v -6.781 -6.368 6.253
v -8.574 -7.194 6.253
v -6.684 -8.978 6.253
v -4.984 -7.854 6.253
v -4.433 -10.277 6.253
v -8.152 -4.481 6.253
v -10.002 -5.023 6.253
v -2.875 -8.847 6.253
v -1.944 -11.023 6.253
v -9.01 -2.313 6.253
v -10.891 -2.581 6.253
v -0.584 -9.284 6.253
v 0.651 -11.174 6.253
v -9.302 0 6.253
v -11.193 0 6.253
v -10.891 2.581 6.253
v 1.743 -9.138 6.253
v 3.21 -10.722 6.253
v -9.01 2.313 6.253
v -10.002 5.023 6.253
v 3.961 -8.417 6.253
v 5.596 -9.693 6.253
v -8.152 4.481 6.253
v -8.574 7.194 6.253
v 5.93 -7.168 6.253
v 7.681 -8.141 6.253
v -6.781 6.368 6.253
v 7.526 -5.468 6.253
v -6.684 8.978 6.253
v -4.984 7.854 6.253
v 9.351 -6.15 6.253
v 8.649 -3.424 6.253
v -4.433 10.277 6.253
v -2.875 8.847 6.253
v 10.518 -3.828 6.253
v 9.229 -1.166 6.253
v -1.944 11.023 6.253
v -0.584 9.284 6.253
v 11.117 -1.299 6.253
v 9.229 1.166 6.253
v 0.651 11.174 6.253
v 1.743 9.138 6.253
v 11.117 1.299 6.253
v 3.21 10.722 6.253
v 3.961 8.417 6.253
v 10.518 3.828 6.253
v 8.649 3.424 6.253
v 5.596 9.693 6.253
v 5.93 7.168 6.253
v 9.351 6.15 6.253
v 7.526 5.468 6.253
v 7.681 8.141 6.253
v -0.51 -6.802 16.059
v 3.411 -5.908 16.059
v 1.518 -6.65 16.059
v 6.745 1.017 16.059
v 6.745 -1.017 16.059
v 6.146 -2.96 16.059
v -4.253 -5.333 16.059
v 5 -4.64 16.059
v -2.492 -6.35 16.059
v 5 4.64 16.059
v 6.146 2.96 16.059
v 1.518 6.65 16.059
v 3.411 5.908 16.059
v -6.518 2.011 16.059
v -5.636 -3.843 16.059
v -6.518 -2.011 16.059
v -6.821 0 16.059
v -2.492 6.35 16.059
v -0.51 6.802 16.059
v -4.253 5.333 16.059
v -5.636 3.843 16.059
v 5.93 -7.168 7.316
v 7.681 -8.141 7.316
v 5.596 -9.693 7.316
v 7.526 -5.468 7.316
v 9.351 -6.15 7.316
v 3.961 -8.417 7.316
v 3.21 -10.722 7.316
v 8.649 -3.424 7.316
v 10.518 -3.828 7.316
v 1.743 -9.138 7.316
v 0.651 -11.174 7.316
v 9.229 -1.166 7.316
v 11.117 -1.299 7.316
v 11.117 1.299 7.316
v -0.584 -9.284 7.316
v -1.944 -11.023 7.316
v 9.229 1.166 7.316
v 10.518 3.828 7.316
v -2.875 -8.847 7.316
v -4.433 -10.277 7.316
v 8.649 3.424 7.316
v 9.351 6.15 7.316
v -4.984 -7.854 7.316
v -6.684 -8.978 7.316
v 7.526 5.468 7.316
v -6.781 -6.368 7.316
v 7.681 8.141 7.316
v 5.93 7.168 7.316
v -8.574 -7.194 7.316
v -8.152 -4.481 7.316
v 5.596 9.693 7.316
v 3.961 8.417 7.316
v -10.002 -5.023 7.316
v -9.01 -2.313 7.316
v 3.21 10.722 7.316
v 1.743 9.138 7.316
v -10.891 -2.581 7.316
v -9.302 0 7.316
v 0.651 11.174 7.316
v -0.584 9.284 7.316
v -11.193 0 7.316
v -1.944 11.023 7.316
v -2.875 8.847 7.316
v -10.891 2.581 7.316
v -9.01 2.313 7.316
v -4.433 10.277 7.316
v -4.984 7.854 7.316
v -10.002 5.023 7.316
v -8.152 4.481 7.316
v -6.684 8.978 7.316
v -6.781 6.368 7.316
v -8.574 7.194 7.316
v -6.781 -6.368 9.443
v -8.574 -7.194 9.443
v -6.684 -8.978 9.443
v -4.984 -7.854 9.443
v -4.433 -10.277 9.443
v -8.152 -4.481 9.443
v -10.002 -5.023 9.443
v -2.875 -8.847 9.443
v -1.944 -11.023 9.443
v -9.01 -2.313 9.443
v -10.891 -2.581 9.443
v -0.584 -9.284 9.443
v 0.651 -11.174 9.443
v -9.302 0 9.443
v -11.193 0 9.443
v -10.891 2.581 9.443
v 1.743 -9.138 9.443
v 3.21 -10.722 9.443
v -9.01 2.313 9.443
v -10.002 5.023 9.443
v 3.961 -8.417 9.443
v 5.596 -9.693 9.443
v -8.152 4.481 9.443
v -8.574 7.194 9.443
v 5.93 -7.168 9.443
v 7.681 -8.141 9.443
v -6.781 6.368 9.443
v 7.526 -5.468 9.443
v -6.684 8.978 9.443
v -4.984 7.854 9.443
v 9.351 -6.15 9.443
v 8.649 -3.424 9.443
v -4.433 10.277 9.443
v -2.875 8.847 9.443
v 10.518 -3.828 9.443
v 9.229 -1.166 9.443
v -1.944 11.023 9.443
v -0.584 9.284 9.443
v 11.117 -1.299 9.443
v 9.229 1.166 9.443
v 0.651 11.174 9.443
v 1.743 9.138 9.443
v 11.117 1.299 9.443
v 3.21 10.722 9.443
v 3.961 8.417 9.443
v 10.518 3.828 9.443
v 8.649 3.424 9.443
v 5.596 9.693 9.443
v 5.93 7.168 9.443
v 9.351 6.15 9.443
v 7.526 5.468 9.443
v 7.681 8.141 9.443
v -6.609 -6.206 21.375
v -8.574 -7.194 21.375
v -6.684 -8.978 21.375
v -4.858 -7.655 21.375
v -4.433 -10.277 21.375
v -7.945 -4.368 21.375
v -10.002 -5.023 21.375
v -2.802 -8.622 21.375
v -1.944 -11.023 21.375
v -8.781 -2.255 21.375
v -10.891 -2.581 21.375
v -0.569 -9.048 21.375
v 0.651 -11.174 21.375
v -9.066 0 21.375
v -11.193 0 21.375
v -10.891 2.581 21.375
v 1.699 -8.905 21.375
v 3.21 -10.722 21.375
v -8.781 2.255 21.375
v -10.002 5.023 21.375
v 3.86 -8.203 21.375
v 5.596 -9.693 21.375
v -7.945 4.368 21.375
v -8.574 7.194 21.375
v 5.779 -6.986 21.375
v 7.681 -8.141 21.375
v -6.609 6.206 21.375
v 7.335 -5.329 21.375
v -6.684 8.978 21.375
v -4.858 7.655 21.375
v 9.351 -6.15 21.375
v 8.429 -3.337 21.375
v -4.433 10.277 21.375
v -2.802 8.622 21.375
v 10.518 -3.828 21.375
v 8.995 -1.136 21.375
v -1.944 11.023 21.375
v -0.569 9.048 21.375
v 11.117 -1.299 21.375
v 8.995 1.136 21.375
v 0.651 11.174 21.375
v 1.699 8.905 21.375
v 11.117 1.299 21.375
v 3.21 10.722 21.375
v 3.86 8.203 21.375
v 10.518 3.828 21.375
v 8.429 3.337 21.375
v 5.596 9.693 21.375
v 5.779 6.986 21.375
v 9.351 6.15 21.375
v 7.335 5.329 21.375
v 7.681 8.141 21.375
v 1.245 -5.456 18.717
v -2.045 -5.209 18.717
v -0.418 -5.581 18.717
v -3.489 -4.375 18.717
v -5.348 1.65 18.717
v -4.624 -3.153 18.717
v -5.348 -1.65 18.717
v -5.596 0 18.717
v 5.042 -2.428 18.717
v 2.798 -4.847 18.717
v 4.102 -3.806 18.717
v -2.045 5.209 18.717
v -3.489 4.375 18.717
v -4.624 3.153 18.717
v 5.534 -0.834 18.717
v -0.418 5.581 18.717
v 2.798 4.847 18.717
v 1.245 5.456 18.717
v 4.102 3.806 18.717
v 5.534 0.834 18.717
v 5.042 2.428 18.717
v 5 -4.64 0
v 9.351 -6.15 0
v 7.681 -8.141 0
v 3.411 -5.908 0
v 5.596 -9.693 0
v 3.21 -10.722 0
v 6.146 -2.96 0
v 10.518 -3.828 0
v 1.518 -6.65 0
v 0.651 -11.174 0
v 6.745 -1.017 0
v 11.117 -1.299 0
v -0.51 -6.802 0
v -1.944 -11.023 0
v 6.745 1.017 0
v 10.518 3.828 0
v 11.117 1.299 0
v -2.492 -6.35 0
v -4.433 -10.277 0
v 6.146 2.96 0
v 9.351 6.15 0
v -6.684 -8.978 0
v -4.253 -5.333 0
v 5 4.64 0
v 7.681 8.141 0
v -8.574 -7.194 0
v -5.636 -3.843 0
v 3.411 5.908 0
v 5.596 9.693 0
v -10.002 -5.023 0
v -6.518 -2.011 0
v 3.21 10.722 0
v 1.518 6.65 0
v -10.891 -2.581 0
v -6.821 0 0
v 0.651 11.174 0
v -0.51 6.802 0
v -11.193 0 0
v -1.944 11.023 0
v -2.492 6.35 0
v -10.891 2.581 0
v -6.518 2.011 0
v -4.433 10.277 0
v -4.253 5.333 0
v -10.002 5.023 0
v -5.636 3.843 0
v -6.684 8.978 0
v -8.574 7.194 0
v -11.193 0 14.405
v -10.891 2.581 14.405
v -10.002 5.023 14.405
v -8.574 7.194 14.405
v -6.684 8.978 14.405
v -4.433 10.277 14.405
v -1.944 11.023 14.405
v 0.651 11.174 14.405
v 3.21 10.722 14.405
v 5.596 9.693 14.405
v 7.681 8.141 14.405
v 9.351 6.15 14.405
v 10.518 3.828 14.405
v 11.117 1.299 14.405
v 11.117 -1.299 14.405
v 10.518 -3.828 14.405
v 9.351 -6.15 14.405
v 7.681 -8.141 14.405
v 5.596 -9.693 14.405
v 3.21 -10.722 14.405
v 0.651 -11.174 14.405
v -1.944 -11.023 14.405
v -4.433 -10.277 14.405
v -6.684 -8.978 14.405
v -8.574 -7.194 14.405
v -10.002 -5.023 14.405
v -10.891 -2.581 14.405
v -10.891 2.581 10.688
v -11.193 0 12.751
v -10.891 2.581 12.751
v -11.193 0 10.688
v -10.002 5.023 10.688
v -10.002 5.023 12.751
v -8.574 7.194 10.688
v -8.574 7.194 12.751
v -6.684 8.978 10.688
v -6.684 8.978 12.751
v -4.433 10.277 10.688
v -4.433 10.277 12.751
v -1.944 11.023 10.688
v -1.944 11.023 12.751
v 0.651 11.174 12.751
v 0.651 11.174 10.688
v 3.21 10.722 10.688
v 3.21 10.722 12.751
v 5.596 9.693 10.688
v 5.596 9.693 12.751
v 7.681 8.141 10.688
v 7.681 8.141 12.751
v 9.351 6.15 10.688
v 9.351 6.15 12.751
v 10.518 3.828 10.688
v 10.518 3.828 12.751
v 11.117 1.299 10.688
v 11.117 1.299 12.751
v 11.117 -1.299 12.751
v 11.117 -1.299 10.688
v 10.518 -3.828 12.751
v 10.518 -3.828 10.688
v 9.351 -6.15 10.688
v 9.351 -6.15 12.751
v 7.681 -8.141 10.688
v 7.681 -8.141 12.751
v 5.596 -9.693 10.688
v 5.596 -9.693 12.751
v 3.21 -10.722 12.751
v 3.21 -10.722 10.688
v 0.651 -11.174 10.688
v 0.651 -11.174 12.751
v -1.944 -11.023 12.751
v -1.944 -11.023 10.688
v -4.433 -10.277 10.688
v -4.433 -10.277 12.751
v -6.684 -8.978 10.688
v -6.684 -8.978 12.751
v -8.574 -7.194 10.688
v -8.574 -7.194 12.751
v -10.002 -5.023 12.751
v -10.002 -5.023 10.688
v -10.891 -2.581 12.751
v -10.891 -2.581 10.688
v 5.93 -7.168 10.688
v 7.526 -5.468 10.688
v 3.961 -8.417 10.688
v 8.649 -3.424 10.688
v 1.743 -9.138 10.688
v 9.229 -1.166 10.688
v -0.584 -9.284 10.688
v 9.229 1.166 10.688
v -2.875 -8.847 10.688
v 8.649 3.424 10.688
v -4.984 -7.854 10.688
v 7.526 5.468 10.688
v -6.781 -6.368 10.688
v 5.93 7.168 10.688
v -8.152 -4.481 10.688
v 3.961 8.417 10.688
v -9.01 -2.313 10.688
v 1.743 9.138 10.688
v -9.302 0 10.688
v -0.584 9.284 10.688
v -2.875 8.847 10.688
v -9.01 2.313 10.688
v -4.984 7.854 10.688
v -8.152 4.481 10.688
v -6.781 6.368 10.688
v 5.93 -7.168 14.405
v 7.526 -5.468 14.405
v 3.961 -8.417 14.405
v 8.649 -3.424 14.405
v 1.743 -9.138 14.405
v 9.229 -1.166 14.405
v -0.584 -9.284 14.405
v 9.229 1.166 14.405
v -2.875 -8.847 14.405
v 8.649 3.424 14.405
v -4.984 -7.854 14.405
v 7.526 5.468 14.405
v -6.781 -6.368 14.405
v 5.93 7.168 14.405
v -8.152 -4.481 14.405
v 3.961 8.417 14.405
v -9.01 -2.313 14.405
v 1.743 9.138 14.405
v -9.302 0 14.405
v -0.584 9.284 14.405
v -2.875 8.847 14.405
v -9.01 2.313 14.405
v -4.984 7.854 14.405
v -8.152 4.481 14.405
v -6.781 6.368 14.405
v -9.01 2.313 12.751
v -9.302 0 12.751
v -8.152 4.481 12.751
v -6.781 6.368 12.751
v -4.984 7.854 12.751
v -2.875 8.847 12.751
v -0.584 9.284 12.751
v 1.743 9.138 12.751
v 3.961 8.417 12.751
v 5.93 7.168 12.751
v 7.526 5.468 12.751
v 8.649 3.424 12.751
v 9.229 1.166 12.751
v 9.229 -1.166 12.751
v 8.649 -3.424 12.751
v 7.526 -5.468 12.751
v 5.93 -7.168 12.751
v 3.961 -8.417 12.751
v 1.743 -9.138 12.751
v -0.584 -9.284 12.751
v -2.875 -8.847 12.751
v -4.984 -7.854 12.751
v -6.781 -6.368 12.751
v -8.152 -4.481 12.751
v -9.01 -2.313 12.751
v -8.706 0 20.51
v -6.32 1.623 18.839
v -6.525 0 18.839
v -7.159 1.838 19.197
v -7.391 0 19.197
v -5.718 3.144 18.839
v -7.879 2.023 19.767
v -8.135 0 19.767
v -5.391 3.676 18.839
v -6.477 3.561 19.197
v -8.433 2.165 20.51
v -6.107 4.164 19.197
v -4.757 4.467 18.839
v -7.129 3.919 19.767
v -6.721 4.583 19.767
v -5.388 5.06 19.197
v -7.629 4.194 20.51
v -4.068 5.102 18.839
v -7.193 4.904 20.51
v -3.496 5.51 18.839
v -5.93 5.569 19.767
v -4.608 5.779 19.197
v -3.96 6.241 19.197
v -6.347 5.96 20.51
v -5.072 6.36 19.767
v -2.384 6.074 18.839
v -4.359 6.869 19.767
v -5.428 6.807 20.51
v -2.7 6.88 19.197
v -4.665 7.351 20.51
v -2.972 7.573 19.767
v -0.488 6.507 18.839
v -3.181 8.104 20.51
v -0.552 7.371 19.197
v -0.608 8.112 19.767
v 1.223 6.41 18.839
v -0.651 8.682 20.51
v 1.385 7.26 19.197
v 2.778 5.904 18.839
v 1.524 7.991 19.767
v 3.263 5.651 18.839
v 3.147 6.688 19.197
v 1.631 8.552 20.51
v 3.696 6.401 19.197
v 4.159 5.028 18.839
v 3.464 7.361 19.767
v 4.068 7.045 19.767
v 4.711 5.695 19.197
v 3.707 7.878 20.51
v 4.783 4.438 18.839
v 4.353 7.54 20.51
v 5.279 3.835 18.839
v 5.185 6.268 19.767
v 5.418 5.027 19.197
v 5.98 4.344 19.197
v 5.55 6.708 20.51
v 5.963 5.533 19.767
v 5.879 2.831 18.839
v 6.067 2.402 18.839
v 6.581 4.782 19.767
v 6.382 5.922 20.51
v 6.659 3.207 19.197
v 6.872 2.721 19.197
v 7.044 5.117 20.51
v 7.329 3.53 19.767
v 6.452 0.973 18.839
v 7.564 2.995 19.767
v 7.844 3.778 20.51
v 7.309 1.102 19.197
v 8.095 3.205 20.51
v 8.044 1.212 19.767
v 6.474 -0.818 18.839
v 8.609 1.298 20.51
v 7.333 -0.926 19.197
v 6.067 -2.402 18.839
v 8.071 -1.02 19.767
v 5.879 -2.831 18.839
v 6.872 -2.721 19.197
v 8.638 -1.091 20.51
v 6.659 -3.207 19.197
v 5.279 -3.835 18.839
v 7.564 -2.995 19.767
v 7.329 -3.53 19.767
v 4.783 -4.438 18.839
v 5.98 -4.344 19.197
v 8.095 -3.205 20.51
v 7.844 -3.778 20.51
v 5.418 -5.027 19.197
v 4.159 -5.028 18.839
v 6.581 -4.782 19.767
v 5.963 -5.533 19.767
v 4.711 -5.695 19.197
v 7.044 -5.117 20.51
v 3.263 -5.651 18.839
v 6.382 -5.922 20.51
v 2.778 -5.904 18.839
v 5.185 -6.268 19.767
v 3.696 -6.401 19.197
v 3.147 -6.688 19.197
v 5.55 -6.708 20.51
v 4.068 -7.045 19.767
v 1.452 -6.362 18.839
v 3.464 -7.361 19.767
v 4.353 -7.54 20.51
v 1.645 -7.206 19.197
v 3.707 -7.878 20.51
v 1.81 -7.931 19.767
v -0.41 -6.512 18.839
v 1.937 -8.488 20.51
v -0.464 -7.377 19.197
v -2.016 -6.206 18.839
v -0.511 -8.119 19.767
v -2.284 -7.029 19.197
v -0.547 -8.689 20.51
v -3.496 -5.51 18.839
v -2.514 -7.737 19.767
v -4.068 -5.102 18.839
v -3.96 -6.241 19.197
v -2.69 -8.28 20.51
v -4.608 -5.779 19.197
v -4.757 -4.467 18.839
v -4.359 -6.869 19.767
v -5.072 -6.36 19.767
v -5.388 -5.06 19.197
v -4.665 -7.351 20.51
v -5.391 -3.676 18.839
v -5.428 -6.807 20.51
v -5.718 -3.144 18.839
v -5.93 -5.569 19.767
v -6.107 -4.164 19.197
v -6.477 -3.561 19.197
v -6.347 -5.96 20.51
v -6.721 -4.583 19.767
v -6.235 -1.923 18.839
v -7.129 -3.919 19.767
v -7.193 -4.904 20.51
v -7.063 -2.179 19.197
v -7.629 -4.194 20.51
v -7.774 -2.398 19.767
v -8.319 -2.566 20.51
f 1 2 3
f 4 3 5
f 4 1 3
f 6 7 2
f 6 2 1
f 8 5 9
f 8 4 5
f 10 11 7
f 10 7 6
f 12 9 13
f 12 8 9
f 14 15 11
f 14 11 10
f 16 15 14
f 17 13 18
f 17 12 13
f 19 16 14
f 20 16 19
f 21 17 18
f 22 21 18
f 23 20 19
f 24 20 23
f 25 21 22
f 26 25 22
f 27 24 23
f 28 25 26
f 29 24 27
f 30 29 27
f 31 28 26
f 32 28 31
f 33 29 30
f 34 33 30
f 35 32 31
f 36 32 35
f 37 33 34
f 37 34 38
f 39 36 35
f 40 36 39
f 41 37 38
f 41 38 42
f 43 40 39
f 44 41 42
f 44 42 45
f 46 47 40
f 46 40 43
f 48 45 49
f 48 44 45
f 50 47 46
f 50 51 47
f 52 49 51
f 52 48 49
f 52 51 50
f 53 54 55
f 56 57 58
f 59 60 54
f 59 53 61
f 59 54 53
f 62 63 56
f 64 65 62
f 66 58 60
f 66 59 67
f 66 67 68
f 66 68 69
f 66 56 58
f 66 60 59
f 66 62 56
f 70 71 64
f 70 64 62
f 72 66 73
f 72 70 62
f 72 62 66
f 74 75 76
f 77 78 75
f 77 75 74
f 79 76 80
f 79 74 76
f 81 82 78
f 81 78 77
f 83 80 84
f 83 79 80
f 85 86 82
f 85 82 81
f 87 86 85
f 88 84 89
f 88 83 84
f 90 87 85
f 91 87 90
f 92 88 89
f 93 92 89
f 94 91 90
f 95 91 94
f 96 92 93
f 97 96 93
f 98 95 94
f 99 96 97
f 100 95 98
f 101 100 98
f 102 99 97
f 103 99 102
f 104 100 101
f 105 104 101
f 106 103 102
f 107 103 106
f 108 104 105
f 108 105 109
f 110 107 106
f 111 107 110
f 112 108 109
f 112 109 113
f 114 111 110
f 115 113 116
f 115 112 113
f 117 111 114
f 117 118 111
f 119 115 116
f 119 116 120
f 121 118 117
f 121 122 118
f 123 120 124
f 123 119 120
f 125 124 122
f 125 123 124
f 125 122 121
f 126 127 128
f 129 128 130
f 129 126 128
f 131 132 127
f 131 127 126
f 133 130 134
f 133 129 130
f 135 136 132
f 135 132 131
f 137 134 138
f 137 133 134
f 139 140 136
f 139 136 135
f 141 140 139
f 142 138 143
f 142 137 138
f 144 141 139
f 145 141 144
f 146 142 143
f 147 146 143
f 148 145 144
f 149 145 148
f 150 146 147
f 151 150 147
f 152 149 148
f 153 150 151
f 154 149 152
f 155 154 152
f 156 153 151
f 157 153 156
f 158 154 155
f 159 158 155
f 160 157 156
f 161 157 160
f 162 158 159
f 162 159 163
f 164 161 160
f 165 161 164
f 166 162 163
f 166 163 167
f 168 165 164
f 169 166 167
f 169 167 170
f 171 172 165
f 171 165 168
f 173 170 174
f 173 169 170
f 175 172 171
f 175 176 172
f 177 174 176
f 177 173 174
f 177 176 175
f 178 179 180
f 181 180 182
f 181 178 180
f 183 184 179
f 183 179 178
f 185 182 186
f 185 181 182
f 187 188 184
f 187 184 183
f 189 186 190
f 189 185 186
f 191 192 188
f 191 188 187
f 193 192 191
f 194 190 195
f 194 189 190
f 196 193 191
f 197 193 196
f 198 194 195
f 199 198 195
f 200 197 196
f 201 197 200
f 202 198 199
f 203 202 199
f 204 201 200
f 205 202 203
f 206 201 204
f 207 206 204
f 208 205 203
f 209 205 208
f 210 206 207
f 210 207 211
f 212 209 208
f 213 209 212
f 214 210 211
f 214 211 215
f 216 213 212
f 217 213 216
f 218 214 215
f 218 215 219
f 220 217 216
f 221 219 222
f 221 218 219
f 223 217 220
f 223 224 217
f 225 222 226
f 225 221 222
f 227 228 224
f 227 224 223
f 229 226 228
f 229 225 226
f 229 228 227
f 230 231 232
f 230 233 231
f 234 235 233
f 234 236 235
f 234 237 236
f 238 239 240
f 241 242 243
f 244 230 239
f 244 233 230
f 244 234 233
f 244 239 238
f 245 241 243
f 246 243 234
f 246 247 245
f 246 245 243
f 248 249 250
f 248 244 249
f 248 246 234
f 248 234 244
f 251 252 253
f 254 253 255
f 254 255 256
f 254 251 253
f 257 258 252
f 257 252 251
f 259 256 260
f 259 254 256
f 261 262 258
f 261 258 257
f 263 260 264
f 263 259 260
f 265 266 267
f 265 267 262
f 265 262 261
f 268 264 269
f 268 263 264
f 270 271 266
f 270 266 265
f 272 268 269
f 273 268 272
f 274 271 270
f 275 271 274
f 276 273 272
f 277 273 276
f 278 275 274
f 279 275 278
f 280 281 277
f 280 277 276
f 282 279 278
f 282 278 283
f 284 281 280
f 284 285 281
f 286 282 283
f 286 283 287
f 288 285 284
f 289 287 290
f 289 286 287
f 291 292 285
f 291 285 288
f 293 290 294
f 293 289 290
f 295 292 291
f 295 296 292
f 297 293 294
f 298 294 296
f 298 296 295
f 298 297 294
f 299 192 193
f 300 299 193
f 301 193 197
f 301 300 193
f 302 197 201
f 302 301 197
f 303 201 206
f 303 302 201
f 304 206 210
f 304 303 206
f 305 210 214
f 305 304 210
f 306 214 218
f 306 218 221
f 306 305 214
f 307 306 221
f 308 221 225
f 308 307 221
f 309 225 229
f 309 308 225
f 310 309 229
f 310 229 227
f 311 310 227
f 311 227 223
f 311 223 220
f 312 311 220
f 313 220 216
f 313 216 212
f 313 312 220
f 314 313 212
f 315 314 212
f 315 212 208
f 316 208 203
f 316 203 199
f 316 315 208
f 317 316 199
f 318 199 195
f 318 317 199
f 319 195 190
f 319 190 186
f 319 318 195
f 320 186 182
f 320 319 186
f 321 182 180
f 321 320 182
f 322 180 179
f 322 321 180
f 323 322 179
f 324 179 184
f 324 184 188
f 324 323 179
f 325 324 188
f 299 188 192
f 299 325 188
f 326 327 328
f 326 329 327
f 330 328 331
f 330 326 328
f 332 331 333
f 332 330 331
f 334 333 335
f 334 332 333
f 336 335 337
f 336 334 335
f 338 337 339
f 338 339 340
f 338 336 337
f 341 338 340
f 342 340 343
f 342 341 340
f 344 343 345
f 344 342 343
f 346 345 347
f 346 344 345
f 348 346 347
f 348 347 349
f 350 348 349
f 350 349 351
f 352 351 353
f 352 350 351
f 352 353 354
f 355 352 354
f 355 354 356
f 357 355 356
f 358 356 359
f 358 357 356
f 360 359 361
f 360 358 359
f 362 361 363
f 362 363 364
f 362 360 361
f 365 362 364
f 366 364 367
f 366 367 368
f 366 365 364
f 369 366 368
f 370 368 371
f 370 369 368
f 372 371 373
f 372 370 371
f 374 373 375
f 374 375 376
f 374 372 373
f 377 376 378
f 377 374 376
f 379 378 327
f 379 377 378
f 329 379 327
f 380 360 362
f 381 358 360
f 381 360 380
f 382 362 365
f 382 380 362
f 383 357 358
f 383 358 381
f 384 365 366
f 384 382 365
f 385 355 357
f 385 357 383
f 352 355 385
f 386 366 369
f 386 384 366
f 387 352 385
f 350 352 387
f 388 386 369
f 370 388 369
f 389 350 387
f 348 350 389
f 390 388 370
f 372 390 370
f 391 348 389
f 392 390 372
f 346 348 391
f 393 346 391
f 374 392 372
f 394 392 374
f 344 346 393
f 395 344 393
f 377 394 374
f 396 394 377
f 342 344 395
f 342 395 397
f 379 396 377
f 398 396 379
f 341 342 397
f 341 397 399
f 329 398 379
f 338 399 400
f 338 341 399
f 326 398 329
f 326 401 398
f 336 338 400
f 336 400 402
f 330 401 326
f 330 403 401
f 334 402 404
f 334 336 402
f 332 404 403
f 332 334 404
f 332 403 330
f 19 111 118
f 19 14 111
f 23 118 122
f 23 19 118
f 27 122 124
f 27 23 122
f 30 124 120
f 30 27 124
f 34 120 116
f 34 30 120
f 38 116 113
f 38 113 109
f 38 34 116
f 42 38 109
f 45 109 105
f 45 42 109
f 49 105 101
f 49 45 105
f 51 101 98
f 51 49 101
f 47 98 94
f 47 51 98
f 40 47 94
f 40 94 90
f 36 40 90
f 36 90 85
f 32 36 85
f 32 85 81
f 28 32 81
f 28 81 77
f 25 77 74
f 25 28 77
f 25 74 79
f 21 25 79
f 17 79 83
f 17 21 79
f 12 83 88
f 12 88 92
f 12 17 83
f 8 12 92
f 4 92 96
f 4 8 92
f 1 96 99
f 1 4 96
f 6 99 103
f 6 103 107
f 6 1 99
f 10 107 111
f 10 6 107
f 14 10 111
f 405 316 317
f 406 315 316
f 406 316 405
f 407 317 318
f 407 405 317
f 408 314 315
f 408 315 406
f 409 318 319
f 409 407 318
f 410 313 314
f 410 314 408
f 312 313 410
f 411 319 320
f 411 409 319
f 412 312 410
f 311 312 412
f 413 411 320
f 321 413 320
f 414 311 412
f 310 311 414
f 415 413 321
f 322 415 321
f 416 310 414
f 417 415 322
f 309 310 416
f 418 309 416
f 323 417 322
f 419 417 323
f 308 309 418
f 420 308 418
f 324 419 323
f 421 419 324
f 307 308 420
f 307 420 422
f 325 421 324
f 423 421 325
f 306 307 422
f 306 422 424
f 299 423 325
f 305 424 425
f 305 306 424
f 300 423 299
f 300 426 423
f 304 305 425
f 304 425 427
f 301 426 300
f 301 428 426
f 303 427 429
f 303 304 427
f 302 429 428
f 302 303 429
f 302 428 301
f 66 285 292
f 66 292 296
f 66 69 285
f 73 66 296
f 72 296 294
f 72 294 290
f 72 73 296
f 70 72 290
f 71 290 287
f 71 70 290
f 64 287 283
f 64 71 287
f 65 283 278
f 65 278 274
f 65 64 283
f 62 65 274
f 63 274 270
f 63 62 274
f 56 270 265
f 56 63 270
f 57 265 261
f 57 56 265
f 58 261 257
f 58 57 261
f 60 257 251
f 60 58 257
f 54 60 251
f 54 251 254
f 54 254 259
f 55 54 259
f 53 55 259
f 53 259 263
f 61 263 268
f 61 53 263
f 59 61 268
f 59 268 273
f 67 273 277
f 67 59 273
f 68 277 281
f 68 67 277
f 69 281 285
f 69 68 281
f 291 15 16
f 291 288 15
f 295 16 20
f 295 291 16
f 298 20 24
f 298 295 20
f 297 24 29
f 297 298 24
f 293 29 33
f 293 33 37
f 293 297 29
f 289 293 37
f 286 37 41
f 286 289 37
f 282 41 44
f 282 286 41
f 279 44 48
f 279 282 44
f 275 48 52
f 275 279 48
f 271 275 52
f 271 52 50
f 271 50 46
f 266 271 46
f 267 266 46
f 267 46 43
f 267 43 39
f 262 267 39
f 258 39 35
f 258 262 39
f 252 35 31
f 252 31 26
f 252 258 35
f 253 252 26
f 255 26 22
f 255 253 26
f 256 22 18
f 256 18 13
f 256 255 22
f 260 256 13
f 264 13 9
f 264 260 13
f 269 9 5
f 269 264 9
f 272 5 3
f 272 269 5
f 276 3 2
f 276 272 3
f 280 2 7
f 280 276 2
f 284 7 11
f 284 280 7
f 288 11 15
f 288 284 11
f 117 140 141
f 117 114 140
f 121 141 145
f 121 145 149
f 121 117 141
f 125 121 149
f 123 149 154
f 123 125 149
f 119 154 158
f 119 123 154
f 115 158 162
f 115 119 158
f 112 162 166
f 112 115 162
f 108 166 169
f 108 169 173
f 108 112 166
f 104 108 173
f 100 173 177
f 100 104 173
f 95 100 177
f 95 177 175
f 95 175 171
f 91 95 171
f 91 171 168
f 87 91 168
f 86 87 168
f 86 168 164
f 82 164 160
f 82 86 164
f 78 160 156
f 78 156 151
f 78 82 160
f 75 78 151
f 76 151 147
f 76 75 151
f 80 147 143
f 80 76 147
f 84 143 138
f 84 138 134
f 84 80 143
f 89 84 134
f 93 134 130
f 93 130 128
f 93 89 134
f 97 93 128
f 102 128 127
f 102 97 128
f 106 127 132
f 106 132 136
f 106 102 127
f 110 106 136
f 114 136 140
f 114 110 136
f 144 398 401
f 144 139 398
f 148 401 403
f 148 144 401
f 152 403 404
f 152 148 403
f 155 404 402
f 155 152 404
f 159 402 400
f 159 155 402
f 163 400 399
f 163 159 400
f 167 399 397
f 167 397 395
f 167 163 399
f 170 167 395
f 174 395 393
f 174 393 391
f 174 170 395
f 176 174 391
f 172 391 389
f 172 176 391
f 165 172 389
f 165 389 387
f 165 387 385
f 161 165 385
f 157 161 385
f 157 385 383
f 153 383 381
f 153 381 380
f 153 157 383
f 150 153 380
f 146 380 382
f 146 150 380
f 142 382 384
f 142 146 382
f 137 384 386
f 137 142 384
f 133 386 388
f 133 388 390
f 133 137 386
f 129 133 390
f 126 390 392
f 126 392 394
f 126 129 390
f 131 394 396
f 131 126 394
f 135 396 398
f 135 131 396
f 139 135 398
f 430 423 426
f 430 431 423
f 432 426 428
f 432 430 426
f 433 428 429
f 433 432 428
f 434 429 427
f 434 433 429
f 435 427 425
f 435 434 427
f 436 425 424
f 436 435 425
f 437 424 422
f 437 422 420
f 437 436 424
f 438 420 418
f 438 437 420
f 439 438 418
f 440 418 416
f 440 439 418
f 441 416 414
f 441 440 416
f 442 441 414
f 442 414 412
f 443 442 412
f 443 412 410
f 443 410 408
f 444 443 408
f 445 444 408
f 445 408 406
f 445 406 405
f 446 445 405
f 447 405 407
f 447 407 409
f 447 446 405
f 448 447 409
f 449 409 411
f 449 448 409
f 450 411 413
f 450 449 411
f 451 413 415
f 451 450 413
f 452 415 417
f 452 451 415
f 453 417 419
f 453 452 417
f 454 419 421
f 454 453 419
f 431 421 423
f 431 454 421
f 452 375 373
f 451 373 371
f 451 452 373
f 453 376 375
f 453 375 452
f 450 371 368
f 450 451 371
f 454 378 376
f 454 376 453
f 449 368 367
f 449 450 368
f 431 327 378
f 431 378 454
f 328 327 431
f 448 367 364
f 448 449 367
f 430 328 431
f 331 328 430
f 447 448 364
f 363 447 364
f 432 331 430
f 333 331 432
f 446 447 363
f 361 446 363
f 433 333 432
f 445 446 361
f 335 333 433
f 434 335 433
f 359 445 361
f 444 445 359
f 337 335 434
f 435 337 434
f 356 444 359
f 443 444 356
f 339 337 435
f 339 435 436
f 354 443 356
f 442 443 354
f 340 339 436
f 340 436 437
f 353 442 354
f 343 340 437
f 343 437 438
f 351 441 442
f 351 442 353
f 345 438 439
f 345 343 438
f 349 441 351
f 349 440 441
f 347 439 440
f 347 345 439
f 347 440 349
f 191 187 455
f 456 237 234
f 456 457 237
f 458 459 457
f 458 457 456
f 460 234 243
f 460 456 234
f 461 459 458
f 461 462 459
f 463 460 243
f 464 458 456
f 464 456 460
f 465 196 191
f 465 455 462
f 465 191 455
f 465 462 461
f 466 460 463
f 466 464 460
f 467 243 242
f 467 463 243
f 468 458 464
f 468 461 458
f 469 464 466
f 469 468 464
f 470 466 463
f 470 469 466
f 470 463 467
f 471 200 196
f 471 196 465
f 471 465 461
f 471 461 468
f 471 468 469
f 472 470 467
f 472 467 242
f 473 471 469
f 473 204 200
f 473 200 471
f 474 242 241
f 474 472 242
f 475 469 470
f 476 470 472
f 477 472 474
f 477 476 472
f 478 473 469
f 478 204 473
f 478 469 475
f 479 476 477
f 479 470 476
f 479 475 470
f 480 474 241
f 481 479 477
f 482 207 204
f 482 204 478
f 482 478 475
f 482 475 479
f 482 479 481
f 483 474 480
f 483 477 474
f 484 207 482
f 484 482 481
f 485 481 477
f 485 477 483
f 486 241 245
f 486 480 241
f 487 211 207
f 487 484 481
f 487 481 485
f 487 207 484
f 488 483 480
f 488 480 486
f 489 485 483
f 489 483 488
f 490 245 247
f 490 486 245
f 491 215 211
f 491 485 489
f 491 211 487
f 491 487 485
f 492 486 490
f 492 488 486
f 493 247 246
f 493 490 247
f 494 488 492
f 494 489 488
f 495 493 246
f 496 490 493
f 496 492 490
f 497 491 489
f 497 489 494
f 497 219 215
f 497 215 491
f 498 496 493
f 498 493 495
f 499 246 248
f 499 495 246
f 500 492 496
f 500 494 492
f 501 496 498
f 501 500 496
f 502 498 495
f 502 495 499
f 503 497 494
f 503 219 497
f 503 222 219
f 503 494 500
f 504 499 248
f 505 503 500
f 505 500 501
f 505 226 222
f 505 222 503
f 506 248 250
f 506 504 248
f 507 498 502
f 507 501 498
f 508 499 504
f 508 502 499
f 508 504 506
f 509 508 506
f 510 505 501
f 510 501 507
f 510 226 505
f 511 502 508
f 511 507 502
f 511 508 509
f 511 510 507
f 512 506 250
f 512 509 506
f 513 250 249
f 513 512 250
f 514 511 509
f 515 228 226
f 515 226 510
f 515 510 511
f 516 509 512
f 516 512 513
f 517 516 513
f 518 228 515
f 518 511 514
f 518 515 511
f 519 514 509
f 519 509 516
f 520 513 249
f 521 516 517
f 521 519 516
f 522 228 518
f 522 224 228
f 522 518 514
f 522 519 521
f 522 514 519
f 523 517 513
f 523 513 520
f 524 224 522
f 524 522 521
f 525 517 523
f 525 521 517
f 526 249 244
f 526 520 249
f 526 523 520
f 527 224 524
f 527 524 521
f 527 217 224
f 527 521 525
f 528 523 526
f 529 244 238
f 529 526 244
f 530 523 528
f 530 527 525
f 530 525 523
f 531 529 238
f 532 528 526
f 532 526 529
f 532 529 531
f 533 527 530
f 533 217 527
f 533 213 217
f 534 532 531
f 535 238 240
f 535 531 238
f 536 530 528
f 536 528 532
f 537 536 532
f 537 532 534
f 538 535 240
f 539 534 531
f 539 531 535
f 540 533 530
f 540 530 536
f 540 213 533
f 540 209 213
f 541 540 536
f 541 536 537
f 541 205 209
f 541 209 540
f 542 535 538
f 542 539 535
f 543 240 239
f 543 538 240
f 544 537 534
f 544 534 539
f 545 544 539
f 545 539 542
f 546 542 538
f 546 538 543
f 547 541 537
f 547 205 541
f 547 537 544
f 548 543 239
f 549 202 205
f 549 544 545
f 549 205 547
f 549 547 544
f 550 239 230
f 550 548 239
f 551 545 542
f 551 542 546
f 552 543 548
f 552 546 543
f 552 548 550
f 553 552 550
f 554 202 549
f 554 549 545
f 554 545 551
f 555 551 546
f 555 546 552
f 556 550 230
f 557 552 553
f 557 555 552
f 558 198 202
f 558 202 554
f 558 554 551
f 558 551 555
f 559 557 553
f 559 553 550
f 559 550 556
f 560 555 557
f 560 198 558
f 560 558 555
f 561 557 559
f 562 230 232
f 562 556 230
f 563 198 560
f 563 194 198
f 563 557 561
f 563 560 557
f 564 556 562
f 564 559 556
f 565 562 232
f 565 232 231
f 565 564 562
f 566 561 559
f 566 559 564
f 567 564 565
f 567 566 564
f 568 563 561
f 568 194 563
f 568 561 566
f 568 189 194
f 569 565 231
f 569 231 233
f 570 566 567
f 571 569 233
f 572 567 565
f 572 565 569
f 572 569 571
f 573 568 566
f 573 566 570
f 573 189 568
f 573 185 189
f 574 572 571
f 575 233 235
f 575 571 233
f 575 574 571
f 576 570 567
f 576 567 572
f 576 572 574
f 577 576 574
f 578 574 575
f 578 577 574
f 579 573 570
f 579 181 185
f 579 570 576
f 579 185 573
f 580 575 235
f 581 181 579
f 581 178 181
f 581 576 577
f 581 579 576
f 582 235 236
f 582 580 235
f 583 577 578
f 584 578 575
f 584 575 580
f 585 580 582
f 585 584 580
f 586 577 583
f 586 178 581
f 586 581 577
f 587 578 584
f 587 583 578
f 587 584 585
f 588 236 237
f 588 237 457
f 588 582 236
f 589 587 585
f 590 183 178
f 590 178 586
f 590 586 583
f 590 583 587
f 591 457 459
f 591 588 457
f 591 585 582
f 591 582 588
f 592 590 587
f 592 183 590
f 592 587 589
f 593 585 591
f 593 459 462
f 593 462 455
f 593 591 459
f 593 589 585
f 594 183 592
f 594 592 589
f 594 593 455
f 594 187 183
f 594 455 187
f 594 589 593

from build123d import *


with BuildPart() as f1:
    # F0 (on Front) → F1 (revolve)
    with BuildSketch(Plane.XZ):
        with BuildLine():
            Line((-6.821418, 16.058695), (0, 16.058695))
            Line((0, 16.058695), (0, 18.716853))
            Line((0, 18.716853), (-5.596306, 18.716853))
            ThreePointArc((-5.596306, 18.716853), (-7.781779, 19.457771), (-9.066084, 21.375012))
            Line((-9.066084, 21.375012), (-11.192611, 21.375012))
            Line((-11.192611, 21.375012), (-11.192611, 14.40473))
            Line((-11.192611, 14.40473), (-9.302366, 14.40473))
            Line((-9.302366, 14.40473), (-9.302366, 12.750765))
            Line((-9.302366, 12.750765), (-11.192611, 12.750765))
            Line((-11.192611, 12.750765), (-11.192611, 10.687506))
            Line((-11.192611, 10.687506), (-9.302366, 10.687506))
            Line((-9.302366, 10.687506), (-9.302366, 9.442835))
            Line((-9.302366, 9.442835), (-11.192611, 9.442835))
            Line((-11.192611, 9.442835), (-11.192611, 7.316309))
            Line((-11.192611, 7.316309), (-9.302366, 7.316309))
            Line((-9.302366, 7.316309), (-9.302366, 6.253046))
            Line((-9.302366, 6.253046), (-11.192611, 6.253046))
            Line((-11.192611, 6.253046), (-11.192611, 0))
            Line((-11.192611, 0), (-6.821418, 0))
            Line((-6.821418, 0), (-6.821418, 16.058695))
        make_face()
    revolve(axis=Axis((0, 0, 17.387774), (0, 0, -1)))


solid = f1.part
